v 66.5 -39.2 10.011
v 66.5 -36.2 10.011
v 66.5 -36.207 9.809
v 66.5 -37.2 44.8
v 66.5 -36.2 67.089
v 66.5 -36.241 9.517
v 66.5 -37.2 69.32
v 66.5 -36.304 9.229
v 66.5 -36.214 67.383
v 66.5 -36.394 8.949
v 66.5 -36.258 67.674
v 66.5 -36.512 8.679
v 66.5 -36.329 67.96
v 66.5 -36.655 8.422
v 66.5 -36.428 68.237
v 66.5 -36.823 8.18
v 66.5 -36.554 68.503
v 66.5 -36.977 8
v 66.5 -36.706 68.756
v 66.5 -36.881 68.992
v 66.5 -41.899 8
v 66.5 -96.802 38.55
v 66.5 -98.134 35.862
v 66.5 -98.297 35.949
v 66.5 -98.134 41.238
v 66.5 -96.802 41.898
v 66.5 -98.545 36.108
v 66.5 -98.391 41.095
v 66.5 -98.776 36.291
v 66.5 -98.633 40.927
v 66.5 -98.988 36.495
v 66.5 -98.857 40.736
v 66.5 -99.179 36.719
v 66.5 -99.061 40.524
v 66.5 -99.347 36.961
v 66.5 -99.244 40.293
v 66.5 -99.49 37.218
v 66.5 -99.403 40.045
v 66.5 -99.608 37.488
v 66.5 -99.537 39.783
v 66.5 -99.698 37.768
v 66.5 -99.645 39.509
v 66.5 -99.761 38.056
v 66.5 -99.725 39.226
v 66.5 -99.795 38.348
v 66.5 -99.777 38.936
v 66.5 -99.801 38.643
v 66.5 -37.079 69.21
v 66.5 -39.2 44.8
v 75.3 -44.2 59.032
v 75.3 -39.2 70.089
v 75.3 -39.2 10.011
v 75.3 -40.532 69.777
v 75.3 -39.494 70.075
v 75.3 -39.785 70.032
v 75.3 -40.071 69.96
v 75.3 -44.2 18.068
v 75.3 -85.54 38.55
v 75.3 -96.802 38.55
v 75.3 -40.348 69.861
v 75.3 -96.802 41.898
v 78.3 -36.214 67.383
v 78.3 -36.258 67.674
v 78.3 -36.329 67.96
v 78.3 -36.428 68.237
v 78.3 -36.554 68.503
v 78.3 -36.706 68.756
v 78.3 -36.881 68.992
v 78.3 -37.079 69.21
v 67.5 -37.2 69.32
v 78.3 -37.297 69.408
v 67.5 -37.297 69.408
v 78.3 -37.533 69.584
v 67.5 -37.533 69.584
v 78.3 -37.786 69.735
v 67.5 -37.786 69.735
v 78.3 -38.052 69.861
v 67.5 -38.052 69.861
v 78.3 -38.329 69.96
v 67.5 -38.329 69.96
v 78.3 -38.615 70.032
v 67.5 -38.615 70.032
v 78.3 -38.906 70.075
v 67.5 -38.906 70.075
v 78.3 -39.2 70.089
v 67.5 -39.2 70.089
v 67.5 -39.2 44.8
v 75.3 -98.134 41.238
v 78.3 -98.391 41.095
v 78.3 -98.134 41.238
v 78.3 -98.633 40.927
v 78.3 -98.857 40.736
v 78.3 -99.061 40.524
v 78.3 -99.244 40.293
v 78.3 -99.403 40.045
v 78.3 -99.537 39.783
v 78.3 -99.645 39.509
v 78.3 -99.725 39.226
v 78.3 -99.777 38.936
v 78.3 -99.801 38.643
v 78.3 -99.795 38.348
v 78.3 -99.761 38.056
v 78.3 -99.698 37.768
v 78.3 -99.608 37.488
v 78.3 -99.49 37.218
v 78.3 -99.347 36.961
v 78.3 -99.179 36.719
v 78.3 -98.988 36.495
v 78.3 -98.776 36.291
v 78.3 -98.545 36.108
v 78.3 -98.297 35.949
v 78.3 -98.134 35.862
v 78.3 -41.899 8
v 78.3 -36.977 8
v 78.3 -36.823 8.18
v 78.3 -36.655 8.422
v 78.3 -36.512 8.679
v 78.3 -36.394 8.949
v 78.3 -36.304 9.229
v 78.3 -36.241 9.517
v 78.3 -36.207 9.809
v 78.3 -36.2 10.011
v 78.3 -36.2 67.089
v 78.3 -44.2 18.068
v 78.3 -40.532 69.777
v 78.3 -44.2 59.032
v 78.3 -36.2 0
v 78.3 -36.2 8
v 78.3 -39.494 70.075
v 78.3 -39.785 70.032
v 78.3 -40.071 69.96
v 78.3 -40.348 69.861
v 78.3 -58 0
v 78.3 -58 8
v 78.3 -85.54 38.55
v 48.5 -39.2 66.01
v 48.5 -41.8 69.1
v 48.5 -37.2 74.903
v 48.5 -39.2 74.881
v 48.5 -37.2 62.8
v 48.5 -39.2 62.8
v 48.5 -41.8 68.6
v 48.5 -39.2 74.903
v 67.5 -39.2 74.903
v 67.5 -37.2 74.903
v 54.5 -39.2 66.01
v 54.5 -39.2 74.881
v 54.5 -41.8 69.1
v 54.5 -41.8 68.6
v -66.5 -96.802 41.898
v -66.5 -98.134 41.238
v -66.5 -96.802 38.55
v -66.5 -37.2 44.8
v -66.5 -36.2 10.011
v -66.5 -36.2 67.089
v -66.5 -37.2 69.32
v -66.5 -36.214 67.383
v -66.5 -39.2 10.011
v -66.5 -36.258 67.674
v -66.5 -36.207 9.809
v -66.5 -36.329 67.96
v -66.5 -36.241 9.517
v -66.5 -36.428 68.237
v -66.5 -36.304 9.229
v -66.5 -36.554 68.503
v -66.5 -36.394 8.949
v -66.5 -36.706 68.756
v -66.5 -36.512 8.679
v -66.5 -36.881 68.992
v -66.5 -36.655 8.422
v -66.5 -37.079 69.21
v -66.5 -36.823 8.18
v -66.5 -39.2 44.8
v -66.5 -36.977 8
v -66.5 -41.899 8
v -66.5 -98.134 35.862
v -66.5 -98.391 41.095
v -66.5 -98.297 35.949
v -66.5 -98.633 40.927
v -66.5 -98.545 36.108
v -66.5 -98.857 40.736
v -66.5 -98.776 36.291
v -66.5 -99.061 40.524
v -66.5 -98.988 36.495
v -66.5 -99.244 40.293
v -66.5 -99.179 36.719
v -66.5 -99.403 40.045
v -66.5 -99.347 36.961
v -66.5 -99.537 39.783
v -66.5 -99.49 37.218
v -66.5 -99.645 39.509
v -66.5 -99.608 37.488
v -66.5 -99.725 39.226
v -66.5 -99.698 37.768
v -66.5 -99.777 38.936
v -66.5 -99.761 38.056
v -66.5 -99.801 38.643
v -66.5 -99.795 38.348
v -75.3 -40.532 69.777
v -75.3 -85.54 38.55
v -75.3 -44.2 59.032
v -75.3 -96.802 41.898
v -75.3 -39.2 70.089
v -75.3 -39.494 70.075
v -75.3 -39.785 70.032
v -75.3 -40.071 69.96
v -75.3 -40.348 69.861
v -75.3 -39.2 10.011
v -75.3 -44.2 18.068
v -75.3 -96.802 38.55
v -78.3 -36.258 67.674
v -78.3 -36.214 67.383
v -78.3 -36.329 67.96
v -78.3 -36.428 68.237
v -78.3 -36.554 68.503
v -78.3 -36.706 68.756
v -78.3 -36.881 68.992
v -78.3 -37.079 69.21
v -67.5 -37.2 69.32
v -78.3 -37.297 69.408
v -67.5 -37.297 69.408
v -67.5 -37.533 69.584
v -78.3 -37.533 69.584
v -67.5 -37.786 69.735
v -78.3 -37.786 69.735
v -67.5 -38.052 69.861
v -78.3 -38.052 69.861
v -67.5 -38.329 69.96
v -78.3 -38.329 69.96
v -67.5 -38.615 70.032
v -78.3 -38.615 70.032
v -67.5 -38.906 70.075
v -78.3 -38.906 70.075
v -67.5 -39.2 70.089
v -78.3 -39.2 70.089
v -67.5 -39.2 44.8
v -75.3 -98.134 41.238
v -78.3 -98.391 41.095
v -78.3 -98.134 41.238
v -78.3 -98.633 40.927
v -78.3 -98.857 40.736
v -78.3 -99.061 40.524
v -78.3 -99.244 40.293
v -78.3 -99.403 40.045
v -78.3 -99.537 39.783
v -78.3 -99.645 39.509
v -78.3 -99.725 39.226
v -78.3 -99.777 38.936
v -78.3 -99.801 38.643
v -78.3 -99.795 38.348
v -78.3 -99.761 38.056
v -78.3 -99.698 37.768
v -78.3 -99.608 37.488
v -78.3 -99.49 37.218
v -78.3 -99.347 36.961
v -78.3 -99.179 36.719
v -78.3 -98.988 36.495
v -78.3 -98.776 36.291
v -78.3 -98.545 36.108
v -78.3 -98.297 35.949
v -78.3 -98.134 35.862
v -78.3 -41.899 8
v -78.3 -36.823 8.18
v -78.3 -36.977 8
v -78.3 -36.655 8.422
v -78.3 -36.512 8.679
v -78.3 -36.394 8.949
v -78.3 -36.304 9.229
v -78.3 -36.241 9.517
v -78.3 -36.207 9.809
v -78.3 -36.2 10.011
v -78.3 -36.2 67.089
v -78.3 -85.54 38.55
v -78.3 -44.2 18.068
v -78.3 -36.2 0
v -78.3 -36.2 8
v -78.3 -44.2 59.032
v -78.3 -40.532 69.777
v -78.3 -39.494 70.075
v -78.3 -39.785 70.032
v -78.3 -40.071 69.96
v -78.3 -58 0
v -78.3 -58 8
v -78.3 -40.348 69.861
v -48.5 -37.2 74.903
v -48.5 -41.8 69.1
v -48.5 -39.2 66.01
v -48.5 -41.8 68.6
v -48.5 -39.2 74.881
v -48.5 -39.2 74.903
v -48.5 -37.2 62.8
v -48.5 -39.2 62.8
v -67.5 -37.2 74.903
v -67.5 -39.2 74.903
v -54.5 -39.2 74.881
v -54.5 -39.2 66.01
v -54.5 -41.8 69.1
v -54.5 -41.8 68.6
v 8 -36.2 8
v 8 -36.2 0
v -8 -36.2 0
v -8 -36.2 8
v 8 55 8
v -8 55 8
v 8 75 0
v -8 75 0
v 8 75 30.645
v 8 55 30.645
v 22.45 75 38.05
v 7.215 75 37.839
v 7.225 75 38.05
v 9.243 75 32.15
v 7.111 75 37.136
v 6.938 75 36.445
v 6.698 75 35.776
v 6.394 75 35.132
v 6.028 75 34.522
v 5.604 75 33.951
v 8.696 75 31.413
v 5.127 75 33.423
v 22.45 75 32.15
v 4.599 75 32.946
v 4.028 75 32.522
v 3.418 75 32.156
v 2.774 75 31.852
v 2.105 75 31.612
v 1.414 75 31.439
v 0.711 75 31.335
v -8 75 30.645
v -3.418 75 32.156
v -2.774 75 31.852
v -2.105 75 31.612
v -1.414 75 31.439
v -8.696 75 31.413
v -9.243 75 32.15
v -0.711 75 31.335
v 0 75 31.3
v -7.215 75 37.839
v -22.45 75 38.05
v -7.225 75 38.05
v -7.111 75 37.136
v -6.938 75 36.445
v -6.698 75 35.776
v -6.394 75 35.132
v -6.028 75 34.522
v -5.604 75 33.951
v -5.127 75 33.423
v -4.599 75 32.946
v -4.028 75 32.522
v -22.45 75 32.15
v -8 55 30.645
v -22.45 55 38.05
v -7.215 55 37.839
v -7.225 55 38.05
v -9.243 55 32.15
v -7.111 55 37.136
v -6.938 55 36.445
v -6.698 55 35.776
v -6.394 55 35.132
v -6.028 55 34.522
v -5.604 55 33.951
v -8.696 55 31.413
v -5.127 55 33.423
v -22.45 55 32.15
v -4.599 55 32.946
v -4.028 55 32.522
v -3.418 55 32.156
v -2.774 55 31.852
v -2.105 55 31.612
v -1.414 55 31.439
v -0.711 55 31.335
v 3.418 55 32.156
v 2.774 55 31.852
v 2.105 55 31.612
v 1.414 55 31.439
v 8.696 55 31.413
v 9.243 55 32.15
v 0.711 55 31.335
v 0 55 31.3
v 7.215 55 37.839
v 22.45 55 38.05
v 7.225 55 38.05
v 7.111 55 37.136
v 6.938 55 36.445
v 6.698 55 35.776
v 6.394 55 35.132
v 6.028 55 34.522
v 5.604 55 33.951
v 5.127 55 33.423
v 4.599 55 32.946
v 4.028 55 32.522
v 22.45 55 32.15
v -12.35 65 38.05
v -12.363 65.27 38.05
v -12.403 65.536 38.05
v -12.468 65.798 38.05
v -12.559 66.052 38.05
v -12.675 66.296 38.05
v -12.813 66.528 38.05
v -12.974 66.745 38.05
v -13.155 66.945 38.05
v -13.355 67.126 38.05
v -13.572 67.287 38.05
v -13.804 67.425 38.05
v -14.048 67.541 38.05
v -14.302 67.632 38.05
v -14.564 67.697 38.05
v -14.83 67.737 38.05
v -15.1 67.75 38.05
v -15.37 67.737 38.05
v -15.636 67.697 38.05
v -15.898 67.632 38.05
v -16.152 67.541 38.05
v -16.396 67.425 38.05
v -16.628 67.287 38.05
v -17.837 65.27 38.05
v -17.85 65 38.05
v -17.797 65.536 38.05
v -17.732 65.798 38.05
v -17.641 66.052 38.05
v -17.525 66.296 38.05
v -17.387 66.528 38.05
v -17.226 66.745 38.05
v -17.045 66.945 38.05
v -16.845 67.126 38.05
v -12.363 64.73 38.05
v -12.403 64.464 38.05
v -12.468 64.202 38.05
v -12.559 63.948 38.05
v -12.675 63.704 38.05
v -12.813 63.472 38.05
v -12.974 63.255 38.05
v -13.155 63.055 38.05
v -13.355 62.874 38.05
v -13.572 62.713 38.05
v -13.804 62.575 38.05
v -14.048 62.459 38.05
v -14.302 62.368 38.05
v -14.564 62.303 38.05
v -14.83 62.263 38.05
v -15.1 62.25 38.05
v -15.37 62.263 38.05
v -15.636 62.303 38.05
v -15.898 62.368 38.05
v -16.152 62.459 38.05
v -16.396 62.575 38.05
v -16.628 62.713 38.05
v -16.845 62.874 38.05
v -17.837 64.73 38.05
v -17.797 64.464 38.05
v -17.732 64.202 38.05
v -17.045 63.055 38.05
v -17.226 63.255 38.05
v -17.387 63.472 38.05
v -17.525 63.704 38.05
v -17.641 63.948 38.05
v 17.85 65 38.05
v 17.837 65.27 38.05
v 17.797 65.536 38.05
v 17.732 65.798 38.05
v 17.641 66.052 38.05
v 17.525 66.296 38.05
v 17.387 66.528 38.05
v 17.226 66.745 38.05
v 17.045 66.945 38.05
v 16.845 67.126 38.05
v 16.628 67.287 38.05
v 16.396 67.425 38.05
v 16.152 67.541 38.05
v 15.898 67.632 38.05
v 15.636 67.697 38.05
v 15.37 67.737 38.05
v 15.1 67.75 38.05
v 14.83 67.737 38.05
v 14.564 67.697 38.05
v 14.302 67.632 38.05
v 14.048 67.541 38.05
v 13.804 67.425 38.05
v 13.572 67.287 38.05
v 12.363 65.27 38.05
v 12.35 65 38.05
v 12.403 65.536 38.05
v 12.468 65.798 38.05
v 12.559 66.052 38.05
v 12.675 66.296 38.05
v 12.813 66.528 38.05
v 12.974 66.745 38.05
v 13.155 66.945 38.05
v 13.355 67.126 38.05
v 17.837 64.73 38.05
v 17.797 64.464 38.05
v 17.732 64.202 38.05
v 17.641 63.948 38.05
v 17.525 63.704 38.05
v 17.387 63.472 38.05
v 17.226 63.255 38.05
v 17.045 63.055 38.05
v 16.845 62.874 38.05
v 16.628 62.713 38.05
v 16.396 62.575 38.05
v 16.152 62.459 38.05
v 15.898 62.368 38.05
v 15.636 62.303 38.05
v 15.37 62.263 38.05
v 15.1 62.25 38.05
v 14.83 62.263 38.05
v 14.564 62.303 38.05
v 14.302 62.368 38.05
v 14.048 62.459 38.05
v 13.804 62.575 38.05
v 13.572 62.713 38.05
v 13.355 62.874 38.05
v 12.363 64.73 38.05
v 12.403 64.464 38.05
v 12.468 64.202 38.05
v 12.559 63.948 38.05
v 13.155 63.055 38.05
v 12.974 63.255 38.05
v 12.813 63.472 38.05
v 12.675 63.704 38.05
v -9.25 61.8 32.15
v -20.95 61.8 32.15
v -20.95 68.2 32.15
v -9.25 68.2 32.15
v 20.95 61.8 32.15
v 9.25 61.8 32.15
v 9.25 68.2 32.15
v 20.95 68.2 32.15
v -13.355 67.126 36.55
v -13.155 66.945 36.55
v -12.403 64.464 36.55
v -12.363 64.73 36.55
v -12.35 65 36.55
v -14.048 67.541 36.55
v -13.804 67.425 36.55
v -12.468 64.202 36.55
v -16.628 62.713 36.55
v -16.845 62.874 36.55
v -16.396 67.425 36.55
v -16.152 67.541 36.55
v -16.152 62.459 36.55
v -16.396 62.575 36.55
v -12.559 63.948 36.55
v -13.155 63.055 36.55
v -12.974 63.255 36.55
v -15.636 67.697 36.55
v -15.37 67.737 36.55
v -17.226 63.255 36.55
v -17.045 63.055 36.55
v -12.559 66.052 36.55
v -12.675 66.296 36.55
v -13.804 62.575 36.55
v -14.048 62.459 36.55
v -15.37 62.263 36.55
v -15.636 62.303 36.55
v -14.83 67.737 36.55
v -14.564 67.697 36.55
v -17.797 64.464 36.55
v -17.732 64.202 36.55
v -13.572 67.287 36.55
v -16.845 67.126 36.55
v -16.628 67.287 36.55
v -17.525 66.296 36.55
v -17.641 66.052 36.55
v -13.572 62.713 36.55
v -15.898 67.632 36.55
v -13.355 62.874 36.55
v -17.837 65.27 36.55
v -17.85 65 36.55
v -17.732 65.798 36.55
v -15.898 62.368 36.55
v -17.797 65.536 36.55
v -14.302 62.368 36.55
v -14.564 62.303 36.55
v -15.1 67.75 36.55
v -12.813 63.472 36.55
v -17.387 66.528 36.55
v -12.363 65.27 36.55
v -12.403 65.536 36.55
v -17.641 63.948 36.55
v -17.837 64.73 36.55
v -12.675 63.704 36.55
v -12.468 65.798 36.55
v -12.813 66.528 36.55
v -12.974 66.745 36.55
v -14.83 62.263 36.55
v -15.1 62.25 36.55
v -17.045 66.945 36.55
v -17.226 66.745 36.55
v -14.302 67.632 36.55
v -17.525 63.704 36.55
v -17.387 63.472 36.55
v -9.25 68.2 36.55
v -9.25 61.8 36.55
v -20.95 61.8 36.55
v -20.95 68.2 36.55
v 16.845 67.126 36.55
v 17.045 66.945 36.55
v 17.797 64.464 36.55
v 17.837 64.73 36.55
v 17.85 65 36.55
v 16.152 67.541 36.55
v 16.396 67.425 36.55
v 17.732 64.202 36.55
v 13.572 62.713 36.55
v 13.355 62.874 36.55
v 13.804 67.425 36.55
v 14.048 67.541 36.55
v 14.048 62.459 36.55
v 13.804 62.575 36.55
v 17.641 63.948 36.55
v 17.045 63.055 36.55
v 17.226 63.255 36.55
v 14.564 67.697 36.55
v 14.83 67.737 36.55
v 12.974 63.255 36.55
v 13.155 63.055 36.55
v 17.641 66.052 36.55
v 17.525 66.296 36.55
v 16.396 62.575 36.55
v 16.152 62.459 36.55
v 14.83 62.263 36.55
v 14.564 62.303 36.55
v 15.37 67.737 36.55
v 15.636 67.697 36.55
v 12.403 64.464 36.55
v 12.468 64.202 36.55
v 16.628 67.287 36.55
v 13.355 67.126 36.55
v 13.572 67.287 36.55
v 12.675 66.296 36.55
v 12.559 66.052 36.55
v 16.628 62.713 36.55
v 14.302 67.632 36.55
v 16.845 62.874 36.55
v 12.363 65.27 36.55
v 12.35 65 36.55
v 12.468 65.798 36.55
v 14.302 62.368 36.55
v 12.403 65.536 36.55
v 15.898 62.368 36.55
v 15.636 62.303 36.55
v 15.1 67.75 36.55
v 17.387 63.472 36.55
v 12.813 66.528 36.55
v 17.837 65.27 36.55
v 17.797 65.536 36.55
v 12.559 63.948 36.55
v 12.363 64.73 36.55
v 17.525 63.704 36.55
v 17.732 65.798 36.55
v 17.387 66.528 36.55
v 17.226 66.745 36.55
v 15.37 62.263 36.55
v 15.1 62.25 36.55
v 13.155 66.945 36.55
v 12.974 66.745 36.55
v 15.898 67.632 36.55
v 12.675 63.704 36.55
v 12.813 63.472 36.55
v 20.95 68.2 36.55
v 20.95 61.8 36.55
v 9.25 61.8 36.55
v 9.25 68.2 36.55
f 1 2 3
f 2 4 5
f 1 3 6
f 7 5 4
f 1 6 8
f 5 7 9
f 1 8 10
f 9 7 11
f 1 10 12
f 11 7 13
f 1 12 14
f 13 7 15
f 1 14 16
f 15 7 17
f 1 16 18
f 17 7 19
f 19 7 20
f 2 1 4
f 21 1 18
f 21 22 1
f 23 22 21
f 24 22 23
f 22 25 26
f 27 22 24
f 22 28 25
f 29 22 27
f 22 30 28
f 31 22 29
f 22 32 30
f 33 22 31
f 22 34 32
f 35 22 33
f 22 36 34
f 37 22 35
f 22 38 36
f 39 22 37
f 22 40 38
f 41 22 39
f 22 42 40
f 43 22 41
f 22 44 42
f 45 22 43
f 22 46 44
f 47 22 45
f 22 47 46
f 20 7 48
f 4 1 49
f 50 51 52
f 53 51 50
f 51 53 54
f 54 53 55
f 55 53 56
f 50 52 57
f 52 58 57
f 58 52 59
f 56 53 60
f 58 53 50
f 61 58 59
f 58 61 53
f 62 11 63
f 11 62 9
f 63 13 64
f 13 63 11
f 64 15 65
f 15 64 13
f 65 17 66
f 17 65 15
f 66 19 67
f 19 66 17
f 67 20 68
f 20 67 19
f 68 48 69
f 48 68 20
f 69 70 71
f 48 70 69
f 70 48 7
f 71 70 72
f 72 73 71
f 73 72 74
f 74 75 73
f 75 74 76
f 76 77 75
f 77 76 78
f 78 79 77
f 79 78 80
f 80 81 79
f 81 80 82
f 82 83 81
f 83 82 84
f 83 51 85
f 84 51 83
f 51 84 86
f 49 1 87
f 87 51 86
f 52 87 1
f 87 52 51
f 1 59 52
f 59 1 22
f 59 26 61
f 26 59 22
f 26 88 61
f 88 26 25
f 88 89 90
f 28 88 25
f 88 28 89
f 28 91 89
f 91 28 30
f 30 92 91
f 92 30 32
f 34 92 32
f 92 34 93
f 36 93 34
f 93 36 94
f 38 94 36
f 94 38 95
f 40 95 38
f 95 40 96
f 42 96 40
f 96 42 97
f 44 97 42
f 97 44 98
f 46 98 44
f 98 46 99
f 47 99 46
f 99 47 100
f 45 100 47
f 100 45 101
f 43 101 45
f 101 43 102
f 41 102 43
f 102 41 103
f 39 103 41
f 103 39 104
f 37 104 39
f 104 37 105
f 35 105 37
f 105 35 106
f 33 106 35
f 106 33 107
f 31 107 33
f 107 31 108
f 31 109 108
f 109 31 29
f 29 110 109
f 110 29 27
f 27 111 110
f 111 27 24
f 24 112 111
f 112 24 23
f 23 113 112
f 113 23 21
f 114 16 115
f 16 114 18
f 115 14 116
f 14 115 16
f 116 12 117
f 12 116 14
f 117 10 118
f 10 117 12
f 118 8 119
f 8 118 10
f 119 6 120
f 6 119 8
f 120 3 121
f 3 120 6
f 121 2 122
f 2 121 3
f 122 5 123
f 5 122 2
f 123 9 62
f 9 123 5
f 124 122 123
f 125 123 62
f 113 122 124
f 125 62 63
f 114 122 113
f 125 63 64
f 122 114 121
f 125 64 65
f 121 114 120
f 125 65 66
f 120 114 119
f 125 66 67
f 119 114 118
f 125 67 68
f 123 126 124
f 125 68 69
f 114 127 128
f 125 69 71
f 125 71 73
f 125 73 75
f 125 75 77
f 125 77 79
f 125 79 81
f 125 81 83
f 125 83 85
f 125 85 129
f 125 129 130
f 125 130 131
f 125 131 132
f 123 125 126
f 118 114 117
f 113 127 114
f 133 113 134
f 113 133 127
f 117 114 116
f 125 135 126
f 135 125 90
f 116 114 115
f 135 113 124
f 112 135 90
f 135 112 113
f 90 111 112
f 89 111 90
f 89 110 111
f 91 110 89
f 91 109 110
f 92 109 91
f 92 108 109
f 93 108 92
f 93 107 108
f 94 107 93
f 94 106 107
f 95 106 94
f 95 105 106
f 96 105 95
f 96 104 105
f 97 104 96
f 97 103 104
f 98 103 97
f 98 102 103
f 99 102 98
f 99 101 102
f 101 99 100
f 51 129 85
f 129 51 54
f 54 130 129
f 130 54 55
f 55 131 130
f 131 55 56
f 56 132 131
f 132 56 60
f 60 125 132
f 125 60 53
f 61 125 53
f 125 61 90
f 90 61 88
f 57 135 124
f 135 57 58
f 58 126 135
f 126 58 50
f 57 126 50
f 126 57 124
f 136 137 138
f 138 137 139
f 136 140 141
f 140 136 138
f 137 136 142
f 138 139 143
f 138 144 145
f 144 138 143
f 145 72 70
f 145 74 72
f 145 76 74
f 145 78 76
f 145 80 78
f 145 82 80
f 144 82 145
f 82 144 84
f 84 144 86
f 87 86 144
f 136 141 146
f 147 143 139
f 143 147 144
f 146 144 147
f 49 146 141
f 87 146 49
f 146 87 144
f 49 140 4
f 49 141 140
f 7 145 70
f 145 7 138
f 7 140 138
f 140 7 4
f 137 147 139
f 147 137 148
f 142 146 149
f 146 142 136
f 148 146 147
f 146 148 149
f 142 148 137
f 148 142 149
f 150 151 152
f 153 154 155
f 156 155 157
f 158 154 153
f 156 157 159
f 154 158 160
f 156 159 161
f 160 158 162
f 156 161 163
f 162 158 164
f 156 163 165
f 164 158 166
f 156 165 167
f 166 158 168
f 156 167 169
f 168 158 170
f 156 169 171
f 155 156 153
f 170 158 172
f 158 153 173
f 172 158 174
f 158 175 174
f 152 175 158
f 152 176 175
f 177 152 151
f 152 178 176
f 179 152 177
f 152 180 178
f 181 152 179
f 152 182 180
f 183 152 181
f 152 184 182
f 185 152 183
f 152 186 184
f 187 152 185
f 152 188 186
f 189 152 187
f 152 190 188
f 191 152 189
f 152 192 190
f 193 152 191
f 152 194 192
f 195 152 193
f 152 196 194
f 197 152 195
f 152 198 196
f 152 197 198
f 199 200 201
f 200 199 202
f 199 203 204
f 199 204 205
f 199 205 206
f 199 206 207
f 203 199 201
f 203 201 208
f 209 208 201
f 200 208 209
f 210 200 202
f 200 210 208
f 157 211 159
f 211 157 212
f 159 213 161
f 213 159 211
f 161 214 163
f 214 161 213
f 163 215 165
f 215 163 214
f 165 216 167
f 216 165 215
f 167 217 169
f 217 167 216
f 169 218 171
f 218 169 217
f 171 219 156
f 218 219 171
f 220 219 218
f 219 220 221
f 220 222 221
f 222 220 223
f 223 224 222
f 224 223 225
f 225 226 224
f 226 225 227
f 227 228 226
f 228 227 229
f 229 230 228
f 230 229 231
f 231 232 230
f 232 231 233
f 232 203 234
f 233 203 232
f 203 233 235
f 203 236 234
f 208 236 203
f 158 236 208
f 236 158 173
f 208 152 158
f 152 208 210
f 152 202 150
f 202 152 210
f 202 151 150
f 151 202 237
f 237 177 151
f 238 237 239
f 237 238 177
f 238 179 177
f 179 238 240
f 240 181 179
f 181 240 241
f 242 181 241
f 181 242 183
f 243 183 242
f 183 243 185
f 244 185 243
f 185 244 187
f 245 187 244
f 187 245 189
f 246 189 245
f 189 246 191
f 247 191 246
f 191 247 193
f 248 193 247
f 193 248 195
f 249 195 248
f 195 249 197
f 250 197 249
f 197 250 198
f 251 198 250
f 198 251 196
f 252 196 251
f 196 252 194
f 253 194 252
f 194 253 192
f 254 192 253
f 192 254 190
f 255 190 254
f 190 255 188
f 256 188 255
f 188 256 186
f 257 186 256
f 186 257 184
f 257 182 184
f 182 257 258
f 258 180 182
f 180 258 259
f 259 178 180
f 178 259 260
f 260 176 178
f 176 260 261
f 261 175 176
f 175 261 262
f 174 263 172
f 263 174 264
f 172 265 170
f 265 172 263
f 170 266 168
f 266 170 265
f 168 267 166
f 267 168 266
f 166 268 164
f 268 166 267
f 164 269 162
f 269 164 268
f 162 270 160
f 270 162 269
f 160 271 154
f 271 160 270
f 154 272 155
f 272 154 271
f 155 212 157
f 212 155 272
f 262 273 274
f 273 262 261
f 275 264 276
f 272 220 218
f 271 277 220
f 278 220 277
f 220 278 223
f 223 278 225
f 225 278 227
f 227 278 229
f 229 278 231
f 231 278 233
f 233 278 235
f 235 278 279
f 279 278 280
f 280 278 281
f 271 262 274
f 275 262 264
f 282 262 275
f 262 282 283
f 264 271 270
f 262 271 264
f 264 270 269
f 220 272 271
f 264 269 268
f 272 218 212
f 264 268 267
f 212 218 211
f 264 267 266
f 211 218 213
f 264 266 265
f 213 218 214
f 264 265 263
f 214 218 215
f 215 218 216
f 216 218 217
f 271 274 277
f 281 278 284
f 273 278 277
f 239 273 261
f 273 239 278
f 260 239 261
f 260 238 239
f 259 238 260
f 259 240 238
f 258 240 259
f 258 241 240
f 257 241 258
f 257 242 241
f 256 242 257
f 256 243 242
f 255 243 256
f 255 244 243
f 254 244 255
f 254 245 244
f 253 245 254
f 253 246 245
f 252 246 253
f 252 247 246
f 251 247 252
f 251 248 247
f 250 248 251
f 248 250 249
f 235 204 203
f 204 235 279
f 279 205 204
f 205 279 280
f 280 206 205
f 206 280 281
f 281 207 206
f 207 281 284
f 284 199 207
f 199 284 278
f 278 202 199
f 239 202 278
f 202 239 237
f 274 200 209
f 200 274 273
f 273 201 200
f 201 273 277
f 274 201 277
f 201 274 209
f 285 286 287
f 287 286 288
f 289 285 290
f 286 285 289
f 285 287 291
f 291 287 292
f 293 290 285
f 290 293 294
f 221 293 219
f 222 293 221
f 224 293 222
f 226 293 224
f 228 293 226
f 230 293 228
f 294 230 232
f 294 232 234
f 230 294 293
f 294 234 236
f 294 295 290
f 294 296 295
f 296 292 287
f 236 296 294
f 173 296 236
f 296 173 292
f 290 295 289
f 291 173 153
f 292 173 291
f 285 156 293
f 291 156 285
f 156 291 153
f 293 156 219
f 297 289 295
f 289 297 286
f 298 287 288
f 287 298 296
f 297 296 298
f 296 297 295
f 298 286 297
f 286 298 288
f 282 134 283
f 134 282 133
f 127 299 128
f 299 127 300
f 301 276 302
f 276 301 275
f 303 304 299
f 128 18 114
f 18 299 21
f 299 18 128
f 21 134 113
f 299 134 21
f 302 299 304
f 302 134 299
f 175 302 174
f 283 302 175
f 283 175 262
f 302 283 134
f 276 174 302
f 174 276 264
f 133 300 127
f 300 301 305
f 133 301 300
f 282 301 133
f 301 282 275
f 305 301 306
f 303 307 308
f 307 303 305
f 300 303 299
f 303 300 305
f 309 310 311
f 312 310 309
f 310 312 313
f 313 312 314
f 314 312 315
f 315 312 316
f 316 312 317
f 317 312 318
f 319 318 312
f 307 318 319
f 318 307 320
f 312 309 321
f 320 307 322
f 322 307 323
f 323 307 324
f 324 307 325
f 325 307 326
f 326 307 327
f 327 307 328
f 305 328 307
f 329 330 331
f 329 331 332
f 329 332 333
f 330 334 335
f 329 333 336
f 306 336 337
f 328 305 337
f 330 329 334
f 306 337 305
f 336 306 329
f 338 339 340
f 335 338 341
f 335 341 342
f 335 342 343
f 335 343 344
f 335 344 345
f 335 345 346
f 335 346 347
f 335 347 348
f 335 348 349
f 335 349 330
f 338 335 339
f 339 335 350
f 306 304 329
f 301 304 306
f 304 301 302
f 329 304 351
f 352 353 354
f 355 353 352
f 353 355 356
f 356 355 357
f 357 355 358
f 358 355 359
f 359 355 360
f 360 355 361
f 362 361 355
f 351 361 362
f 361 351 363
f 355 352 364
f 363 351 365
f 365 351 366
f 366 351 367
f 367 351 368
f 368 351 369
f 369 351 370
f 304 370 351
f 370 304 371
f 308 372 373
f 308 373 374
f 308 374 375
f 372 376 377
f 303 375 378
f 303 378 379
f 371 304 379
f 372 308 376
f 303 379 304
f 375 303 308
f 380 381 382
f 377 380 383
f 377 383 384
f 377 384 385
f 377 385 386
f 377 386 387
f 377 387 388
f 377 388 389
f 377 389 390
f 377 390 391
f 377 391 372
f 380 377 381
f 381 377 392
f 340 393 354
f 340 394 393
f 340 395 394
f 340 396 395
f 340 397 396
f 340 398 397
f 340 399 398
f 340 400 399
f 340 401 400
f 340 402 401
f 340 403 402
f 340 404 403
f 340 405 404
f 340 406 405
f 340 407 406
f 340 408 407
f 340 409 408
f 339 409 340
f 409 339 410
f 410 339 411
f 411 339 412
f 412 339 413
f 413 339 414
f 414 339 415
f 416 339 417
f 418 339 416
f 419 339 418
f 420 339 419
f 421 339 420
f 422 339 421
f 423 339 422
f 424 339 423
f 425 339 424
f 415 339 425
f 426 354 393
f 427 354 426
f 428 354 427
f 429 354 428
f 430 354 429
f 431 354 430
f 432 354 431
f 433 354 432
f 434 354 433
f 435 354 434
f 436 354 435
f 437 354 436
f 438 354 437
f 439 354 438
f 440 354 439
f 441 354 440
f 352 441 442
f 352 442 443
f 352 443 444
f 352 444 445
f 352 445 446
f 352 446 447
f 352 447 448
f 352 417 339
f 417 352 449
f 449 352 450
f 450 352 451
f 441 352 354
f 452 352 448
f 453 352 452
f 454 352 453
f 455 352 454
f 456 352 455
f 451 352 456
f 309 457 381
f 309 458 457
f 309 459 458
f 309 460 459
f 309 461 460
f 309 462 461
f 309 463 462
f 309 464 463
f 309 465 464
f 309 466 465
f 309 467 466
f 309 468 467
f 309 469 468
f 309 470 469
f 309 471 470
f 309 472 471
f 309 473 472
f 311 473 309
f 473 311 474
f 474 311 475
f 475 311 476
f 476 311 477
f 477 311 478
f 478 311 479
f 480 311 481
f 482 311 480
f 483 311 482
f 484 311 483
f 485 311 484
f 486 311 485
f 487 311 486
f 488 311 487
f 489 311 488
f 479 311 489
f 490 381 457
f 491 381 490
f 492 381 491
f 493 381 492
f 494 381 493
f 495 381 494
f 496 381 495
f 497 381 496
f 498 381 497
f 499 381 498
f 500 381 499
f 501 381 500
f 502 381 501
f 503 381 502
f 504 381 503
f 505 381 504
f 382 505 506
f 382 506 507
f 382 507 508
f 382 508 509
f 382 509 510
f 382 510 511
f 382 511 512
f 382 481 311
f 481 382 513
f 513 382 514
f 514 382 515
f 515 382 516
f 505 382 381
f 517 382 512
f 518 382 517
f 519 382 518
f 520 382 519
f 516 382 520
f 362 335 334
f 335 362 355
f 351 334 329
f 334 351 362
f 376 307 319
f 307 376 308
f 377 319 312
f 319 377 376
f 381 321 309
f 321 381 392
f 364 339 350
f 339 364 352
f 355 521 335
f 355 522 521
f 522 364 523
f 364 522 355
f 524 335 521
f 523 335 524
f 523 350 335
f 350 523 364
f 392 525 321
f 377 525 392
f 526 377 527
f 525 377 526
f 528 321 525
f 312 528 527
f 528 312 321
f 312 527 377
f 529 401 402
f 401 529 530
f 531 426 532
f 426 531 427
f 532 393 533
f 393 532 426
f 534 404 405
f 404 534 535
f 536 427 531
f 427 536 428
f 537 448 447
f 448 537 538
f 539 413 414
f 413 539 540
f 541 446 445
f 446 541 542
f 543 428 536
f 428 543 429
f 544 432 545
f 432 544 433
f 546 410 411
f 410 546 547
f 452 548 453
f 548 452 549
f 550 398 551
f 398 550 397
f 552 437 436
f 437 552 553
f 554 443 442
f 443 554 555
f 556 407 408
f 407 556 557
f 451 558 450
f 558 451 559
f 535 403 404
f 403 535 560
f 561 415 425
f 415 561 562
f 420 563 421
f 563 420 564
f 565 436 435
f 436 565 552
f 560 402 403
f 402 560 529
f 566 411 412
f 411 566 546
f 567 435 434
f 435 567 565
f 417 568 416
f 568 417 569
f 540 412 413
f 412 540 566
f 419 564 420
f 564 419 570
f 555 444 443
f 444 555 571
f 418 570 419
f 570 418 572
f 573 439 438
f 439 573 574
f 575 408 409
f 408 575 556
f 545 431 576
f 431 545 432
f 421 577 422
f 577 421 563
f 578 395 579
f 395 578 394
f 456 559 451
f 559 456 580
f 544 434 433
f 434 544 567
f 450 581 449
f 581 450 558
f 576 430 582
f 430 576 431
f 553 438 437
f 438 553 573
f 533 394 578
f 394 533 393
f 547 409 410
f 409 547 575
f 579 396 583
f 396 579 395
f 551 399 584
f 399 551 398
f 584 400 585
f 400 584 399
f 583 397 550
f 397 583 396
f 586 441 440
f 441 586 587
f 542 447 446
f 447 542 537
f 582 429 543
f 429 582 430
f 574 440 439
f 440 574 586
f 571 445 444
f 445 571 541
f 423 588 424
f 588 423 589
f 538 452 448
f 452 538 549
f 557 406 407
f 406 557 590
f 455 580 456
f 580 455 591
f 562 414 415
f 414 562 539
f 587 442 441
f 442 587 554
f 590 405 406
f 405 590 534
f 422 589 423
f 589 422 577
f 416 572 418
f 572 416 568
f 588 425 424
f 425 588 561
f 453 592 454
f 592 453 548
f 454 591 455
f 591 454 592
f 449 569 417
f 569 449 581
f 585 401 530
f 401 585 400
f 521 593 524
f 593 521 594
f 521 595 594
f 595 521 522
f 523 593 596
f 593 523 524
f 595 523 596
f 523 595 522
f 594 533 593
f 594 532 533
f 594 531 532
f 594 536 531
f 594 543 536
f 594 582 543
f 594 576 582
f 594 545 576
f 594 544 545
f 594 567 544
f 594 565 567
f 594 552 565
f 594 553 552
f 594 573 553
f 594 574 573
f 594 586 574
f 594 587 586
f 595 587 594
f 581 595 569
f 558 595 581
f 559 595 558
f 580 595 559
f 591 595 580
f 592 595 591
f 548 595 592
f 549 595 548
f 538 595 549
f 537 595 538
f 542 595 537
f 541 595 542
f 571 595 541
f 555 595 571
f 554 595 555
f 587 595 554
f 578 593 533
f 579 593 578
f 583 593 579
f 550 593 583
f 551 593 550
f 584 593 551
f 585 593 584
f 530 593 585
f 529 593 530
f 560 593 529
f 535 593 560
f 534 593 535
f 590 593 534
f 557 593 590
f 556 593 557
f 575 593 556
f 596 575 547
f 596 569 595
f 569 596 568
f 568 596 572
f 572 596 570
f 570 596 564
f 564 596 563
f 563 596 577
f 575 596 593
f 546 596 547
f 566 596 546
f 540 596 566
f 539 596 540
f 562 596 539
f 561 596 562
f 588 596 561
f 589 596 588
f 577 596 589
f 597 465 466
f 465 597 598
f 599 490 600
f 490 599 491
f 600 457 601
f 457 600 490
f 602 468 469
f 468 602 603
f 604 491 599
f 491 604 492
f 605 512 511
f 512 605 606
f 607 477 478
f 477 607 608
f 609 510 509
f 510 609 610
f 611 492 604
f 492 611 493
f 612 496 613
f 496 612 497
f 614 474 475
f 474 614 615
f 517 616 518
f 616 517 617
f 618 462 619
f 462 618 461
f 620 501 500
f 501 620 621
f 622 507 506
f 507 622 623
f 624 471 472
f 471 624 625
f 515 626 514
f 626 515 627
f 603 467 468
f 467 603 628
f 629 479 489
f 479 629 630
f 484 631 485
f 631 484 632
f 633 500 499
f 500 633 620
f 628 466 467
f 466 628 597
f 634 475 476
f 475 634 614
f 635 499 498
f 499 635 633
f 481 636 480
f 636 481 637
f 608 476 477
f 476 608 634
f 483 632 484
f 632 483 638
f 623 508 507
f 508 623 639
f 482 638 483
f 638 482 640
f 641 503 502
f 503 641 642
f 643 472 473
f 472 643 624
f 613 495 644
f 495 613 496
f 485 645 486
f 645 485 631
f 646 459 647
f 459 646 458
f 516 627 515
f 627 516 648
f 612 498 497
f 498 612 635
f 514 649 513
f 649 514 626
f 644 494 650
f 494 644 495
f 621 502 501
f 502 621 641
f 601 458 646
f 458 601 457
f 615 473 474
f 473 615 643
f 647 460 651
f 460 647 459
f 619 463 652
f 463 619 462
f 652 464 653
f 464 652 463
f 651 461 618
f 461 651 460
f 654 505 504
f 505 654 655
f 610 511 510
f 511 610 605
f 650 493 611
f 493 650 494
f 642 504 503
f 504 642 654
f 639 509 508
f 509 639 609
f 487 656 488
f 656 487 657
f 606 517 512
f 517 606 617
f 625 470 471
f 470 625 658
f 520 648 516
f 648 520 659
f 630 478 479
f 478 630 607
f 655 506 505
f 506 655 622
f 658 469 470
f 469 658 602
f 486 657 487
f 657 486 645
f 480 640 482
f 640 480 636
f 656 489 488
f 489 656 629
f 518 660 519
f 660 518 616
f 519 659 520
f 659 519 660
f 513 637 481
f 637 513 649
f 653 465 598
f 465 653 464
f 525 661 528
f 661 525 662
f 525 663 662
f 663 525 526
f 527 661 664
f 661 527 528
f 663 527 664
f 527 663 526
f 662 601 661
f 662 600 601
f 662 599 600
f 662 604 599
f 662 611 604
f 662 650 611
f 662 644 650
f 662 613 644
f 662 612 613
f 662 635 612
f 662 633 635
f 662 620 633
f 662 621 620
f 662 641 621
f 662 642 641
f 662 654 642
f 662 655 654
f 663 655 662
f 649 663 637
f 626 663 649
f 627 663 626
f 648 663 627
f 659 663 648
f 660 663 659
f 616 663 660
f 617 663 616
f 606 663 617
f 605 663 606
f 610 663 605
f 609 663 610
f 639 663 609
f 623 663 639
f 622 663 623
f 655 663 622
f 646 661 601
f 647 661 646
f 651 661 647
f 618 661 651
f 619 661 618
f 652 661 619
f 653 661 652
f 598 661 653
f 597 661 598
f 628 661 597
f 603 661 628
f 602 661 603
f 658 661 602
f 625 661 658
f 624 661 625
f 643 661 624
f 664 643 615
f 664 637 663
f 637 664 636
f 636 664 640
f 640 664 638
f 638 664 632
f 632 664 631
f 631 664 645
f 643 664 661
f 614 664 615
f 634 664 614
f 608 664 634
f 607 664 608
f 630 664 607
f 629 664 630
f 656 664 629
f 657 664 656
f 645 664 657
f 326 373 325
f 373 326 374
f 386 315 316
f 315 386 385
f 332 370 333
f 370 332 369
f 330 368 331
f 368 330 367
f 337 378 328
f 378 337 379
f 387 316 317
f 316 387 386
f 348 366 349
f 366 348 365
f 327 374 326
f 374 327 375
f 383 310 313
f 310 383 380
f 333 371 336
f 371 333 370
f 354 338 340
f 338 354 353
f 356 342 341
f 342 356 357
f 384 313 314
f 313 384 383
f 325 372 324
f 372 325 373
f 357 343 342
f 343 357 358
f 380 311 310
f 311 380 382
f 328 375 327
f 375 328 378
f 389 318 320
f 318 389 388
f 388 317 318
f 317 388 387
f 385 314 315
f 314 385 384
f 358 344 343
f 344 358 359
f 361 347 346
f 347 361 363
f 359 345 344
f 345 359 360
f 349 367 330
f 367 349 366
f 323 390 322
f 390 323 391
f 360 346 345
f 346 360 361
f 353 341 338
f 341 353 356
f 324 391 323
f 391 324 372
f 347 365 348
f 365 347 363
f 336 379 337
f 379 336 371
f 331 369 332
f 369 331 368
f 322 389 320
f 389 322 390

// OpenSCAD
// Speaker cradle for the Earson ER-151, with the arm and the fixed half of the tube clamp. Print 1.
// Print orientation: beam and arm flat on the bed. Supports only under the low side of each cup (tree, build plate only). Tune the snap first: speaker_snap_test.scad
include <params.scad>
include <lib.scad>

rotate([90, 0, 0]) translate([0, -spk_arm_y0, 0]) speaker_cradle();
